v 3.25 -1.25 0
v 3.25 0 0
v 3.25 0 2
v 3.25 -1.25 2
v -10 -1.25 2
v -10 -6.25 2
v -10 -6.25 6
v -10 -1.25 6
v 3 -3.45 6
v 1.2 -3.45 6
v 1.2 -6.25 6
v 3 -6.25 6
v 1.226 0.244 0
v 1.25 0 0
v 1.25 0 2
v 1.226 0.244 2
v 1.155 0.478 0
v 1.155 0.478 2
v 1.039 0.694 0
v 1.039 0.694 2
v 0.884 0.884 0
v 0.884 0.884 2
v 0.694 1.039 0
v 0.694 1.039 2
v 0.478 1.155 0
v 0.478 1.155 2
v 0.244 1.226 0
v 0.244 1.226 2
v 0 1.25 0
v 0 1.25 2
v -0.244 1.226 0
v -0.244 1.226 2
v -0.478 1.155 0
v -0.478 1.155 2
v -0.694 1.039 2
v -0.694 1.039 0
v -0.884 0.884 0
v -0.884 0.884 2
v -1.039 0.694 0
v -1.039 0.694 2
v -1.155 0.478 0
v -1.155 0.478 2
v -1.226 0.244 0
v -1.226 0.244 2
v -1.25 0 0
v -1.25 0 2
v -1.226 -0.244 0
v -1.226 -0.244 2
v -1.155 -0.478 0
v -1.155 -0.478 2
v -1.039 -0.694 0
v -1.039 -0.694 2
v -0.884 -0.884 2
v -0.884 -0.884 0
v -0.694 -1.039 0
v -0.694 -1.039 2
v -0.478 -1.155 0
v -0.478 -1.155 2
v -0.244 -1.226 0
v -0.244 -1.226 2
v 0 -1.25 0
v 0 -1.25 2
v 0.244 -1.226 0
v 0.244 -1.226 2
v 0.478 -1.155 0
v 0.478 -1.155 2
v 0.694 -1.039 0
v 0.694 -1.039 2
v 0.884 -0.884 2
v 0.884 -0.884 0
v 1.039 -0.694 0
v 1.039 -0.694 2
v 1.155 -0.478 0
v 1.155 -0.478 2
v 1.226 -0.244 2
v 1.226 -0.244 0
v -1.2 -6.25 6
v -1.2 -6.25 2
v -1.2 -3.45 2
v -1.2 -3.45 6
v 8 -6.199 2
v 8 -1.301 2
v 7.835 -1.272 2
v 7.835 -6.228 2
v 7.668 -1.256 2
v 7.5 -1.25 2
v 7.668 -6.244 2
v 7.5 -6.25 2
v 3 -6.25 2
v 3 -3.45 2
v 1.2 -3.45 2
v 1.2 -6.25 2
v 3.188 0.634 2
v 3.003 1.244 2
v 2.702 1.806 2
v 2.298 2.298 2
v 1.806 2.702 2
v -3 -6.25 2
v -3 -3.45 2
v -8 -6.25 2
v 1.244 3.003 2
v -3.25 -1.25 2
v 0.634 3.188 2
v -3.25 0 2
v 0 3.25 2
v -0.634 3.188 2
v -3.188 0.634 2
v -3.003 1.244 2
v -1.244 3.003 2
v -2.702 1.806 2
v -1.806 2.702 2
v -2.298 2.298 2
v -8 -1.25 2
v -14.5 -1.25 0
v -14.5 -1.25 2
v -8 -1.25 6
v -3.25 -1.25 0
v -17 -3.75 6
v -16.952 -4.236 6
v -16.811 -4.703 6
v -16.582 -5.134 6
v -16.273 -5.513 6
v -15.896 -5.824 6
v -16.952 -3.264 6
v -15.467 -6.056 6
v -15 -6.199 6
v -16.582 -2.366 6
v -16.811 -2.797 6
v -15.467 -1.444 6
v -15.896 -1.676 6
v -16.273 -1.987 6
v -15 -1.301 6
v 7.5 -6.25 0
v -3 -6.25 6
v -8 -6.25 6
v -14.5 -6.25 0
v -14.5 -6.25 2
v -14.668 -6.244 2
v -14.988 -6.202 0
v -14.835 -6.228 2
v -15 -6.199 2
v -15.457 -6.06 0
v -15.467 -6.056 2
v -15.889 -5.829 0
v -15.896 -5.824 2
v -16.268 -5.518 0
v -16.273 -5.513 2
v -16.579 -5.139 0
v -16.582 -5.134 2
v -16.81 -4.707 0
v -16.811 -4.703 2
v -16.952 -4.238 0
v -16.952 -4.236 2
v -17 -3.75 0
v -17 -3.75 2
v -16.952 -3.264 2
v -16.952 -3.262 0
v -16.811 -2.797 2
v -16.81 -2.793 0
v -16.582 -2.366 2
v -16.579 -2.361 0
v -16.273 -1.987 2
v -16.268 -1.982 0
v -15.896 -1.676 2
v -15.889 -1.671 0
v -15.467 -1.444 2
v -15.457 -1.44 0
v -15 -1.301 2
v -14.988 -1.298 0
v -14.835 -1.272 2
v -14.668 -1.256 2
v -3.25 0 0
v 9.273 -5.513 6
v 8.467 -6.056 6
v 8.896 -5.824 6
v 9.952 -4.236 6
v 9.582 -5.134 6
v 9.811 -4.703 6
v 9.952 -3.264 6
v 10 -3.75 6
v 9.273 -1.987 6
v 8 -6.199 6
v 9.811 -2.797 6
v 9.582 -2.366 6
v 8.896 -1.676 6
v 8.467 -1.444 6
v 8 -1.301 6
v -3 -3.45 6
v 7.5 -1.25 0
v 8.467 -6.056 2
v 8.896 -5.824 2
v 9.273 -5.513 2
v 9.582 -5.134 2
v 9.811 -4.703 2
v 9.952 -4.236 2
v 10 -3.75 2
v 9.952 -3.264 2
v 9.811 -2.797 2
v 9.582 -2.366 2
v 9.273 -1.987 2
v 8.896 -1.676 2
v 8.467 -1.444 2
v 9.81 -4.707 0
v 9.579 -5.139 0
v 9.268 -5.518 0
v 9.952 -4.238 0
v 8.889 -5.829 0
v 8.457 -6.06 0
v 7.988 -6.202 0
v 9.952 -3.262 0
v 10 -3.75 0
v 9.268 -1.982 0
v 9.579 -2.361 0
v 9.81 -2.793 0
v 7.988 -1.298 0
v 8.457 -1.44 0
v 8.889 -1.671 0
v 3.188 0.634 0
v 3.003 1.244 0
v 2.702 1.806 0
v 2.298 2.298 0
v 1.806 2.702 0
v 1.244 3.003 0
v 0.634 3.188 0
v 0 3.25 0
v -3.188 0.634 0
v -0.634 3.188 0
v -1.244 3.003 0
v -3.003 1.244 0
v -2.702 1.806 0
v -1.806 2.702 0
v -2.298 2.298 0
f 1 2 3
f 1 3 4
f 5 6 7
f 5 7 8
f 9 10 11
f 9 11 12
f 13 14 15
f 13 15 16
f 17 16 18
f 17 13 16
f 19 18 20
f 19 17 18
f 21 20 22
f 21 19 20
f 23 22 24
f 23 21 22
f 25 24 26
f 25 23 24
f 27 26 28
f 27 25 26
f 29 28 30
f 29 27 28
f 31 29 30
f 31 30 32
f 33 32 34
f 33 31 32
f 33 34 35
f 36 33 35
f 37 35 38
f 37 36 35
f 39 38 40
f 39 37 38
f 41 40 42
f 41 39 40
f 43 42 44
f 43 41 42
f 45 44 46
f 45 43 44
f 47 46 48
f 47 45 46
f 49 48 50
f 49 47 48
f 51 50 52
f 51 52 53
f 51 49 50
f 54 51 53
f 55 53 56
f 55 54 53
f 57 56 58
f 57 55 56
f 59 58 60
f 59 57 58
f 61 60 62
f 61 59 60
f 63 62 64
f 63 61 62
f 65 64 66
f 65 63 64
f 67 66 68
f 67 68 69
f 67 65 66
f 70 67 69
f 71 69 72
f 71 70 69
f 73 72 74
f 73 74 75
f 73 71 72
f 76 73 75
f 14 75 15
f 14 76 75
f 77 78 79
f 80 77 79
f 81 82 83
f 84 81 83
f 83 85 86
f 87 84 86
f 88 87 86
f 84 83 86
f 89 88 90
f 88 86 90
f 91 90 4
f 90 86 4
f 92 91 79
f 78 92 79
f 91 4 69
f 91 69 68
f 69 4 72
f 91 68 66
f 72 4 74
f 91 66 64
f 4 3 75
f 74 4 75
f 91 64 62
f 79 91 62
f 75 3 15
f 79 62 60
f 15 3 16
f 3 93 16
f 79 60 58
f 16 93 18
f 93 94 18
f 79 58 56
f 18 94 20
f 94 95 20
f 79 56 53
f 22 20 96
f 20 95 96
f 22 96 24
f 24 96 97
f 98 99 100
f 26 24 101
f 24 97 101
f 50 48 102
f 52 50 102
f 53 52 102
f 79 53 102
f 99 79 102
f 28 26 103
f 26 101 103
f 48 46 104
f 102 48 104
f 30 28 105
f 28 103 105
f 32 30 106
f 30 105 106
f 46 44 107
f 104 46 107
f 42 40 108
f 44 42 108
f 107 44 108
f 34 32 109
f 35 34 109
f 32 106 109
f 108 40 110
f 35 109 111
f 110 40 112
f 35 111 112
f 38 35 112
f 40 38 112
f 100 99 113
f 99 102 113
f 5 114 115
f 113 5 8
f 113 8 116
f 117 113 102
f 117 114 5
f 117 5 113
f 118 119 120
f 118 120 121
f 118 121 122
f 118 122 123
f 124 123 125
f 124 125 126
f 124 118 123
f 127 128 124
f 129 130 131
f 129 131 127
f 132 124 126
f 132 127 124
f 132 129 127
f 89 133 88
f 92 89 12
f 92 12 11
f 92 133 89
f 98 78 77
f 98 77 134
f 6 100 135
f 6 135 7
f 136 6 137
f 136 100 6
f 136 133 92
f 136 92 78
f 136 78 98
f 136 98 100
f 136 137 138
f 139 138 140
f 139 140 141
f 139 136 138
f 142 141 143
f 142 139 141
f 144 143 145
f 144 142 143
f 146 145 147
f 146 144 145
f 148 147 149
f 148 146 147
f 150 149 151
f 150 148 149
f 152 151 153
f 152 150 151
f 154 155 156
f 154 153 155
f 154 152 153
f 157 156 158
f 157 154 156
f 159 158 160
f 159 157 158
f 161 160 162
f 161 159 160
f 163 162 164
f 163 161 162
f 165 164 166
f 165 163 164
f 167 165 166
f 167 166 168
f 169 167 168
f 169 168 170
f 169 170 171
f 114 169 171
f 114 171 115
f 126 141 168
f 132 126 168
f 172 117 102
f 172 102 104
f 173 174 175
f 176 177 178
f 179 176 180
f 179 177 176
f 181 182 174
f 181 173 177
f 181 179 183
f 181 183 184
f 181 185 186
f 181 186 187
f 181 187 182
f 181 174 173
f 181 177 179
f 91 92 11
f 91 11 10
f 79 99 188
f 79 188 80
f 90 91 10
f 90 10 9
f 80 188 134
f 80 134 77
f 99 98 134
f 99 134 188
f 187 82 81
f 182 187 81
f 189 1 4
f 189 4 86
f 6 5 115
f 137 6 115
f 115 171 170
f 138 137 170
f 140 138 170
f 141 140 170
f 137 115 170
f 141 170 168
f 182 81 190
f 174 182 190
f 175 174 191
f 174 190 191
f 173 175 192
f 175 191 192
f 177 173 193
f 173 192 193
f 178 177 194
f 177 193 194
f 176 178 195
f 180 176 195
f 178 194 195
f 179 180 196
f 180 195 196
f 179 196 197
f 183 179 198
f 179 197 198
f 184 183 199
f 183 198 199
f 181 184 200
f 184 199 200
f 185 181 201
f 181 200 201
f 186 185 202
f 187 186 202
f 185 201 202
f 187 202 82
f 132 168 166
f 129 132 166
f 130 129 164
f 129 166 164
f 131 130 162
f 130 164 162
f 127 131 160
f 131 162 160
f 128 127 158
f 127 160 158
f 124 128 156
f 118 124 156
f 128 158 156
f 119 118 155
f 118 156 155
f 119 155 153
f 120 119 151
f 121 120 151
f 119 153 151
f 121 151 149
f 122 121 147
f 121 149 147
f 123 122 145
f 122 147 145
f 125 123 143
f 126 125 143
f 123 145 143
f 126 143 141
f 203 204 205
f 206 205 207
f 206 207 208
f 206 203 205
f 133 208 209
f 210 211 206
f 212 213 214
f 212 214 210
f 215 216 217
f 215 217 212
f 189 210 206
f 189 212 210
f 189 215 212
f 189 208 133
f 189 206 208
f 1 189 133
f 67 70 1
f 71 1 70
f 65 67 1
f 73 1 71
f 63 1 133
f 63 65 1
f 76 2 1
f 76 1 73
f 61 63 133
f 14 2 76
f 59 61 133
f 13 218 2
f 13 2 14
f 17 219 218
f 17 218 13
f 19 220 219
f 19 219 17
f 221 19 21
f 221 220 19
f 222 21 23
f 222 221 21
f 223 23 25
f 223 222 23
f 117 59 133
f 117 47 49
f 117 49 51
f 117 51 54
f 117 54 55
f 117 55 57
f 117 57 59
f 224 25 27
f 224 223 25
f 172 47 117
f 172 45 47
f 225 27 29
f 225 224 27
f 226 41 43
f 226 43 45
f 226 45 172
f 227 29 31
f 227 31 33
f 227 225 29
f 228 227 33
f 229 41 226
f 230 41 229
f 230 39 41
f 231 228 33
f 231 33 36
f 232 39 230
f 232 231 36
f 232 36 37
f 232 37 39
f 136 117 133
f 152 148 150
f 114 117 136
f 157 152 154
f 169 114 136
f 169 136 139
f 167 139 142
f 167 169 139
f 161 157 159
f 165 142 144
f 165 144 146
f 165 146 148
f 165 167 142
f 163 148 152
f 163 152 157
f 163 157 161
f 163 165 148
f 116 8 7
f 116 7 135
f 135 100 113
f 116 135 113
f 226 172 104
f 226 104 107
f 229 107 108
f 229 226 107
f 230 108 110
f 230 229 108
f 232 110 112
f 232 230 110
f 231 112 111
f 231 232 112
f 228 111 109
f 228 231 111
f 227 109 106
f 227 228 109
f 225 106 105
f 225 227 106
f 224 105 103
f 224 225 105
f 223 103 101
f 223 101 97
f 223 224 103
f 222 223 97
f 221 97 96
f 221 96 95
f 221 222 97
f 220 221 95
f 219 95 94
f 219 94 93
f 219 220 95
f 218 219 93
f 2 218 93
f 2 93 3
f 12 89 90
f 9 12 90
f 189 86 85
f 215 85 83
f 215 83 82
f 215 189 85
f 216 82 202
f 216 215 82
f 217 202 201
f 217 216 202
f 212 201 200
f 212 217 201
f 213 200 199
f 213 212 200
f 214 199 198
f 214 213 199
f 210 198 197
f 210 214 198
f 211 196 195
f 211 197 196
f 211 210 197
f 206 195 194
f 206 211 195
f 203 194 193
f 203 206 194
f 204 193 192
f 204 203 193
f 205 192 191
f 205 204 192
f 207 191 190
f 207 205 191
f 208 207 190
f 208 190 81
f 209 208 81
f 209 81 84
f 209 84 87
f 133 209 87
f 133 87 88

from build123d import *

# Parameters (mm, degrees)
SKETCH1_R           = 1.25
BOSS_EXTRUDE1_DEPTH = 2
SKETCH2_W           = 1.8
SKETCH2_H           = 2.8
SKETCH2_W_2         = 2
SKETCH2_H_2         = 5
BOSS_EXTRUDE2_DEPTH = 4


with BuildPart() as part:
    # Sketch1 → Boss-Extrude1 (new body)
    with BuildSketch(Plane.XY):
        with BuildLine():
            Line((-14.5, -1.25), (-3.25, -1.25))
            Line((-3.25, -1.25), (-3.25, 0))
            ThreePointArc((-3.25, 0), (0, 3.25), (3.25, 0))
            Line((3.25, 0), (3.25, -1.25))
            Line((3.25, -1.25), (7.5, -1.25))
            ThreePointArc((7.5, -1.25), (10, -3.75), (7.5, -6.25))
            Line((7.5, -6.25), (-14.5, -6.25))
            ThreePointArc((-14.5, -6.25), (-17, -3.75), (-14.5, -1.25))
        make_face()
        Circle(SKETCH1_R, mode=Mode.SUBTRACT)
    extrude(amount=BOSS_EXTRUDE1_DEPTH)

    # Sketch2 → Boss-Extrude2 (add)
    with BuildSketch(Plane.XY.offset(2)):
        with Locations((-2.1, -4.85)):
            Rectangle(SKETCH2_W, SKETCH2_H)
        with Locations((2.1, -4.85)):
            Rectangle(SKETCH2_W, SKETCH2_H)
        with Locations((-9, -3.75)):
            Rectangle(SKETCH2_W_2, SKETCH2_H_2)
        with BuildLine():
            ThreePointArc((8, -6.199489743), (10, -3.75), (8, -1.300510257))
            Line((8, -1.300510257), (8, -6.199489743))
        make_face()
        with BuildLine():
            Line((-15, -6.199489743), (-15, -1.300510257))
            ThreePointArc((-15, -1.300510257), (-17, -3.75), (-15, -6.199489743))
        make_face()
    extrude(amount=BOSS_EXTRUDE2_DEPTH)


solid = part.part
